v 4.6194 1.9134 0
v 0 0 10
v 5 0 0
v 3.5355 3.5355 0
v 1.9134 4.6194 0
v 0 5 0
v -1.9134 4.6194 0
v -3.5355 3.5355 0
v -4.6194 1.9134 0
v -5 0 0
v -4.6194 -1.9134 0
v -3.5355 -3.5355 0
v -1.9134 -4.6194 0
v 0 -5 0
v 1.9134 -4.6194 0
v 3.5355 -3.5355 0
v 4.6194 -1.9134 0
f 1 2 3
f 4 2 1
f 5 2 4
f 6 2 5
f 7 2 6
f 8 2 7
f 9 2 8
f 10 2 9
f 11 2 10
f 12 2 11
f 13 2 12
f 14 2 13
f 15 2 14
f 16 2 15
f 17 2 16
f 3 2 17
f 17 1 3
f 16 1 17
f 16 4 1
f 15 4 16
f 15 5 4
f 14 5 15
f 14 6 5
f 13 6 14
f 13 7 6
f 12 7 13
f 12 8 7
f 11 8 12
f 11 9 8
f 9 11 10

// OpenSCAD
// The exact-geometry audit's case x11 (docs/audits/exact-geometry-rust.md).
// volume: 261.79938779914943
cylinder(r1=5, r2=0, h=10);
